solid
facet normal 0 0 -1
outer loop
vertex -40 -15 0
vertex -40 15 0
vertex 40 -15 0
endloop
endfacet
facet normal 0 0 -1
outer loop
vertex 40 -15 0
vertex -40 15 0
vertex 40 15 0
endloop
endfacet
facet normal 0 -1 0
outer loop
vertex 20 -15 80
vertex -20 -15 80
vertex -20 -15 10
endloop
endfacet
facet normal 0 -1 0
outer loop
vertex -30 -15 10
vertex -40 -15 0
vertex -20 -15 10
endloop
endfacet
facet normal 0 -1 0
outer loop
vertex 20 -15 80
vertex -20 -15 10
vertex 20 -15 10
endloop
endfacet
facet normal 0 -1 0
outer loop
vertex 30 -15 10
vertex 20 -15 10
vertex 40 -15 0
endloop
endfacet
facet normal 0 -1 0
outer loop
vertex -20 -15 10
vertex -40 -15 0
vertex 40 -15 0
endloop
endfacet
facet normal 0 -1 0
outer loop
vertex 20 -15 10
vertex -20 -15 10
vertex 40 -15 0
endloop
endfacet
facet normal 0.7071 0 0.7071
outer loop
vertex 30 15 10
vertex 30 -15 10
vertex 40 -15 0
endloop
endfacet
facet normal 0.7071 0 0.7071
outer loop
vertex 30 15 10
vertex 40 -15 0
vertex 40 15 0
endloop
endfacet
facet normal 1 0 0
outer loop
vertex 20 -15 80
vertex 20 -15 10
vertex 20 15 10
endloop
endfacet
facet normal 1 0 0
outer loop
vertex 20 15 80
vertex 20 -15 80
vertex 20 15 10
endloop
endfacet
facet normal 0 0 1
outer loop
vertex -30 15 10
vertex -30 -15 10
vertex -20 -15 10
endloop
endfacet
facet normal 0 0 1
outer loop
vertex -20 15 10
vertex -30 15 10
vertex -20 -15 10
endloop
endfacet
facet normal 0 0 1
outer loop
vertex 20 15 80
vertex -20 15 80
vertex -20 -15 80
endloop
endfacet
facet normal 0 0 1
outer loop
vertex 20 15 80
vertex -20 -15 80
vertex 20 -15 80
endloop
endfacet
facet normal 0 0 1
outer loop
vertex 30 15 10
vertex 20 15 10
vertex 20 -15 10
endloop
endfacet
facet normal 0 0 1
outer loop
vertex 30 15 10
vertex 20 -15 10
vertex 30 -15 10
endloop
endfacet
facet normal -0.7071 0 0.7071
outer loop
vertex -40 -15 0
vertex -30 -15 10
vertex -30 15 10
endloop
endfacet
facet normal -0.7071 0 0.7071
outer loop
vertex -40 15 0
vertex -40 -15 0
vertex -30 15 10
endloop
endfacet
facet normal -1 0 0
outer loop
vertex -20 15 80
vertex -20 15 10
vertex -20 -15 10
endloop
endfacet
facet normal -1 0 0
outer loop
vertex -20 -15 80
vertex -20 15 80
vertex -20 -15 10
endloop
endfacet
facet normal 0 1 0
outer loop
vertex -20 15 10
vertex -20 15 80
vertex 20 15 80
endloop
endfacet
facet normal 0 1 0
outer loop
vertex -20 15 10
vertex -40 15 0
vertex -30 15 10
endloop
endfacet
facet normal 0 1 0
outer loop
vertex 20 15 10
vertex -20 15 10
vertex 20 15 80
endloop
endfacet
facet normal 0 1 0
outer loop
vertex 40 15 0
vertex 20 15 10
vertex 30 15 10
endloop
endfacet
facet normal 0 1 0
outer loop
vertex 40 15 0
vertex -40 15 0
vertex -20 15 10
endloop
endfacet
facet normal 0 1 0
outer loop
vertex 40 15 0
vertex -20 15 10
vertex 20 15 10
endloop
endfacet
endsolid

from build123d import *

# Parameters (mm, degrees)
F0_W      = 80
F0_H      = 30
F1_DEPTH  = 10
F2_SIZE   = 9.99999
F4_DEPTH  = 40
F4_FACE_W = 40
F4_FACE_H = 30
F5_DEPTH  = 40


# Not quite as in the source:
# - a fillet or chamfer is up to 0.001 mm smaller than in the source, because OpenCascade refuses the exact size


with BuildPart() as f1:
    # F0 (on Top) → F1 (new body)
    with BuildSketch(Plane.XY):
        Rectangle(F0_W, F0_H)
    extrude(amount=F1_DEPTH)

    # F2 (size 10 in the source; OpenCascade refuses exactly that, so slightly less here)
    f2_edges = [f1.edges().sort_by_distance(p)[0] for p in [
        (40, 0, 10),
        (-40, 0, 10),
    ]]
    chamfer(f2_edges, length=F2_SIZE)

    # F3 (on Top) → F4 (join)
    with BuildSketch(Plane.XY):
        Polygon((20, -15), (20, 15), (16.5369563365, -15), align=None)
        Polygon((16.5369563365, -15), (20, 15), (-16.5369563365, 15), (-20, -15), align=None)
        Polygon((-20, -15), (-16.5369563365, 15), (-20, 15), align=None)
    extrude(amount=F4_DEPTH)

    # F3 (on Top) + F4_face (on face) → F5 (join)
    with BuildSketch(Plane.XY):
        Polygon((20, -15), (20, 15), (16.5369563365, -15), align=None)
        Polygon((16.5369563365, -15), (20, 15), (-16.5369563365, 15), (-20, -15), align=None)
        Polygon((-20, -15), (-16.5369563365, 15), (-20, 15), align=None)
    with BuildSketch(Plane.XY.offset(40)):
        Rectangle(F4_FACE_W, F4_FACE_H)
    extrude(amount=F5_DEPTH)


solid = f1.part
